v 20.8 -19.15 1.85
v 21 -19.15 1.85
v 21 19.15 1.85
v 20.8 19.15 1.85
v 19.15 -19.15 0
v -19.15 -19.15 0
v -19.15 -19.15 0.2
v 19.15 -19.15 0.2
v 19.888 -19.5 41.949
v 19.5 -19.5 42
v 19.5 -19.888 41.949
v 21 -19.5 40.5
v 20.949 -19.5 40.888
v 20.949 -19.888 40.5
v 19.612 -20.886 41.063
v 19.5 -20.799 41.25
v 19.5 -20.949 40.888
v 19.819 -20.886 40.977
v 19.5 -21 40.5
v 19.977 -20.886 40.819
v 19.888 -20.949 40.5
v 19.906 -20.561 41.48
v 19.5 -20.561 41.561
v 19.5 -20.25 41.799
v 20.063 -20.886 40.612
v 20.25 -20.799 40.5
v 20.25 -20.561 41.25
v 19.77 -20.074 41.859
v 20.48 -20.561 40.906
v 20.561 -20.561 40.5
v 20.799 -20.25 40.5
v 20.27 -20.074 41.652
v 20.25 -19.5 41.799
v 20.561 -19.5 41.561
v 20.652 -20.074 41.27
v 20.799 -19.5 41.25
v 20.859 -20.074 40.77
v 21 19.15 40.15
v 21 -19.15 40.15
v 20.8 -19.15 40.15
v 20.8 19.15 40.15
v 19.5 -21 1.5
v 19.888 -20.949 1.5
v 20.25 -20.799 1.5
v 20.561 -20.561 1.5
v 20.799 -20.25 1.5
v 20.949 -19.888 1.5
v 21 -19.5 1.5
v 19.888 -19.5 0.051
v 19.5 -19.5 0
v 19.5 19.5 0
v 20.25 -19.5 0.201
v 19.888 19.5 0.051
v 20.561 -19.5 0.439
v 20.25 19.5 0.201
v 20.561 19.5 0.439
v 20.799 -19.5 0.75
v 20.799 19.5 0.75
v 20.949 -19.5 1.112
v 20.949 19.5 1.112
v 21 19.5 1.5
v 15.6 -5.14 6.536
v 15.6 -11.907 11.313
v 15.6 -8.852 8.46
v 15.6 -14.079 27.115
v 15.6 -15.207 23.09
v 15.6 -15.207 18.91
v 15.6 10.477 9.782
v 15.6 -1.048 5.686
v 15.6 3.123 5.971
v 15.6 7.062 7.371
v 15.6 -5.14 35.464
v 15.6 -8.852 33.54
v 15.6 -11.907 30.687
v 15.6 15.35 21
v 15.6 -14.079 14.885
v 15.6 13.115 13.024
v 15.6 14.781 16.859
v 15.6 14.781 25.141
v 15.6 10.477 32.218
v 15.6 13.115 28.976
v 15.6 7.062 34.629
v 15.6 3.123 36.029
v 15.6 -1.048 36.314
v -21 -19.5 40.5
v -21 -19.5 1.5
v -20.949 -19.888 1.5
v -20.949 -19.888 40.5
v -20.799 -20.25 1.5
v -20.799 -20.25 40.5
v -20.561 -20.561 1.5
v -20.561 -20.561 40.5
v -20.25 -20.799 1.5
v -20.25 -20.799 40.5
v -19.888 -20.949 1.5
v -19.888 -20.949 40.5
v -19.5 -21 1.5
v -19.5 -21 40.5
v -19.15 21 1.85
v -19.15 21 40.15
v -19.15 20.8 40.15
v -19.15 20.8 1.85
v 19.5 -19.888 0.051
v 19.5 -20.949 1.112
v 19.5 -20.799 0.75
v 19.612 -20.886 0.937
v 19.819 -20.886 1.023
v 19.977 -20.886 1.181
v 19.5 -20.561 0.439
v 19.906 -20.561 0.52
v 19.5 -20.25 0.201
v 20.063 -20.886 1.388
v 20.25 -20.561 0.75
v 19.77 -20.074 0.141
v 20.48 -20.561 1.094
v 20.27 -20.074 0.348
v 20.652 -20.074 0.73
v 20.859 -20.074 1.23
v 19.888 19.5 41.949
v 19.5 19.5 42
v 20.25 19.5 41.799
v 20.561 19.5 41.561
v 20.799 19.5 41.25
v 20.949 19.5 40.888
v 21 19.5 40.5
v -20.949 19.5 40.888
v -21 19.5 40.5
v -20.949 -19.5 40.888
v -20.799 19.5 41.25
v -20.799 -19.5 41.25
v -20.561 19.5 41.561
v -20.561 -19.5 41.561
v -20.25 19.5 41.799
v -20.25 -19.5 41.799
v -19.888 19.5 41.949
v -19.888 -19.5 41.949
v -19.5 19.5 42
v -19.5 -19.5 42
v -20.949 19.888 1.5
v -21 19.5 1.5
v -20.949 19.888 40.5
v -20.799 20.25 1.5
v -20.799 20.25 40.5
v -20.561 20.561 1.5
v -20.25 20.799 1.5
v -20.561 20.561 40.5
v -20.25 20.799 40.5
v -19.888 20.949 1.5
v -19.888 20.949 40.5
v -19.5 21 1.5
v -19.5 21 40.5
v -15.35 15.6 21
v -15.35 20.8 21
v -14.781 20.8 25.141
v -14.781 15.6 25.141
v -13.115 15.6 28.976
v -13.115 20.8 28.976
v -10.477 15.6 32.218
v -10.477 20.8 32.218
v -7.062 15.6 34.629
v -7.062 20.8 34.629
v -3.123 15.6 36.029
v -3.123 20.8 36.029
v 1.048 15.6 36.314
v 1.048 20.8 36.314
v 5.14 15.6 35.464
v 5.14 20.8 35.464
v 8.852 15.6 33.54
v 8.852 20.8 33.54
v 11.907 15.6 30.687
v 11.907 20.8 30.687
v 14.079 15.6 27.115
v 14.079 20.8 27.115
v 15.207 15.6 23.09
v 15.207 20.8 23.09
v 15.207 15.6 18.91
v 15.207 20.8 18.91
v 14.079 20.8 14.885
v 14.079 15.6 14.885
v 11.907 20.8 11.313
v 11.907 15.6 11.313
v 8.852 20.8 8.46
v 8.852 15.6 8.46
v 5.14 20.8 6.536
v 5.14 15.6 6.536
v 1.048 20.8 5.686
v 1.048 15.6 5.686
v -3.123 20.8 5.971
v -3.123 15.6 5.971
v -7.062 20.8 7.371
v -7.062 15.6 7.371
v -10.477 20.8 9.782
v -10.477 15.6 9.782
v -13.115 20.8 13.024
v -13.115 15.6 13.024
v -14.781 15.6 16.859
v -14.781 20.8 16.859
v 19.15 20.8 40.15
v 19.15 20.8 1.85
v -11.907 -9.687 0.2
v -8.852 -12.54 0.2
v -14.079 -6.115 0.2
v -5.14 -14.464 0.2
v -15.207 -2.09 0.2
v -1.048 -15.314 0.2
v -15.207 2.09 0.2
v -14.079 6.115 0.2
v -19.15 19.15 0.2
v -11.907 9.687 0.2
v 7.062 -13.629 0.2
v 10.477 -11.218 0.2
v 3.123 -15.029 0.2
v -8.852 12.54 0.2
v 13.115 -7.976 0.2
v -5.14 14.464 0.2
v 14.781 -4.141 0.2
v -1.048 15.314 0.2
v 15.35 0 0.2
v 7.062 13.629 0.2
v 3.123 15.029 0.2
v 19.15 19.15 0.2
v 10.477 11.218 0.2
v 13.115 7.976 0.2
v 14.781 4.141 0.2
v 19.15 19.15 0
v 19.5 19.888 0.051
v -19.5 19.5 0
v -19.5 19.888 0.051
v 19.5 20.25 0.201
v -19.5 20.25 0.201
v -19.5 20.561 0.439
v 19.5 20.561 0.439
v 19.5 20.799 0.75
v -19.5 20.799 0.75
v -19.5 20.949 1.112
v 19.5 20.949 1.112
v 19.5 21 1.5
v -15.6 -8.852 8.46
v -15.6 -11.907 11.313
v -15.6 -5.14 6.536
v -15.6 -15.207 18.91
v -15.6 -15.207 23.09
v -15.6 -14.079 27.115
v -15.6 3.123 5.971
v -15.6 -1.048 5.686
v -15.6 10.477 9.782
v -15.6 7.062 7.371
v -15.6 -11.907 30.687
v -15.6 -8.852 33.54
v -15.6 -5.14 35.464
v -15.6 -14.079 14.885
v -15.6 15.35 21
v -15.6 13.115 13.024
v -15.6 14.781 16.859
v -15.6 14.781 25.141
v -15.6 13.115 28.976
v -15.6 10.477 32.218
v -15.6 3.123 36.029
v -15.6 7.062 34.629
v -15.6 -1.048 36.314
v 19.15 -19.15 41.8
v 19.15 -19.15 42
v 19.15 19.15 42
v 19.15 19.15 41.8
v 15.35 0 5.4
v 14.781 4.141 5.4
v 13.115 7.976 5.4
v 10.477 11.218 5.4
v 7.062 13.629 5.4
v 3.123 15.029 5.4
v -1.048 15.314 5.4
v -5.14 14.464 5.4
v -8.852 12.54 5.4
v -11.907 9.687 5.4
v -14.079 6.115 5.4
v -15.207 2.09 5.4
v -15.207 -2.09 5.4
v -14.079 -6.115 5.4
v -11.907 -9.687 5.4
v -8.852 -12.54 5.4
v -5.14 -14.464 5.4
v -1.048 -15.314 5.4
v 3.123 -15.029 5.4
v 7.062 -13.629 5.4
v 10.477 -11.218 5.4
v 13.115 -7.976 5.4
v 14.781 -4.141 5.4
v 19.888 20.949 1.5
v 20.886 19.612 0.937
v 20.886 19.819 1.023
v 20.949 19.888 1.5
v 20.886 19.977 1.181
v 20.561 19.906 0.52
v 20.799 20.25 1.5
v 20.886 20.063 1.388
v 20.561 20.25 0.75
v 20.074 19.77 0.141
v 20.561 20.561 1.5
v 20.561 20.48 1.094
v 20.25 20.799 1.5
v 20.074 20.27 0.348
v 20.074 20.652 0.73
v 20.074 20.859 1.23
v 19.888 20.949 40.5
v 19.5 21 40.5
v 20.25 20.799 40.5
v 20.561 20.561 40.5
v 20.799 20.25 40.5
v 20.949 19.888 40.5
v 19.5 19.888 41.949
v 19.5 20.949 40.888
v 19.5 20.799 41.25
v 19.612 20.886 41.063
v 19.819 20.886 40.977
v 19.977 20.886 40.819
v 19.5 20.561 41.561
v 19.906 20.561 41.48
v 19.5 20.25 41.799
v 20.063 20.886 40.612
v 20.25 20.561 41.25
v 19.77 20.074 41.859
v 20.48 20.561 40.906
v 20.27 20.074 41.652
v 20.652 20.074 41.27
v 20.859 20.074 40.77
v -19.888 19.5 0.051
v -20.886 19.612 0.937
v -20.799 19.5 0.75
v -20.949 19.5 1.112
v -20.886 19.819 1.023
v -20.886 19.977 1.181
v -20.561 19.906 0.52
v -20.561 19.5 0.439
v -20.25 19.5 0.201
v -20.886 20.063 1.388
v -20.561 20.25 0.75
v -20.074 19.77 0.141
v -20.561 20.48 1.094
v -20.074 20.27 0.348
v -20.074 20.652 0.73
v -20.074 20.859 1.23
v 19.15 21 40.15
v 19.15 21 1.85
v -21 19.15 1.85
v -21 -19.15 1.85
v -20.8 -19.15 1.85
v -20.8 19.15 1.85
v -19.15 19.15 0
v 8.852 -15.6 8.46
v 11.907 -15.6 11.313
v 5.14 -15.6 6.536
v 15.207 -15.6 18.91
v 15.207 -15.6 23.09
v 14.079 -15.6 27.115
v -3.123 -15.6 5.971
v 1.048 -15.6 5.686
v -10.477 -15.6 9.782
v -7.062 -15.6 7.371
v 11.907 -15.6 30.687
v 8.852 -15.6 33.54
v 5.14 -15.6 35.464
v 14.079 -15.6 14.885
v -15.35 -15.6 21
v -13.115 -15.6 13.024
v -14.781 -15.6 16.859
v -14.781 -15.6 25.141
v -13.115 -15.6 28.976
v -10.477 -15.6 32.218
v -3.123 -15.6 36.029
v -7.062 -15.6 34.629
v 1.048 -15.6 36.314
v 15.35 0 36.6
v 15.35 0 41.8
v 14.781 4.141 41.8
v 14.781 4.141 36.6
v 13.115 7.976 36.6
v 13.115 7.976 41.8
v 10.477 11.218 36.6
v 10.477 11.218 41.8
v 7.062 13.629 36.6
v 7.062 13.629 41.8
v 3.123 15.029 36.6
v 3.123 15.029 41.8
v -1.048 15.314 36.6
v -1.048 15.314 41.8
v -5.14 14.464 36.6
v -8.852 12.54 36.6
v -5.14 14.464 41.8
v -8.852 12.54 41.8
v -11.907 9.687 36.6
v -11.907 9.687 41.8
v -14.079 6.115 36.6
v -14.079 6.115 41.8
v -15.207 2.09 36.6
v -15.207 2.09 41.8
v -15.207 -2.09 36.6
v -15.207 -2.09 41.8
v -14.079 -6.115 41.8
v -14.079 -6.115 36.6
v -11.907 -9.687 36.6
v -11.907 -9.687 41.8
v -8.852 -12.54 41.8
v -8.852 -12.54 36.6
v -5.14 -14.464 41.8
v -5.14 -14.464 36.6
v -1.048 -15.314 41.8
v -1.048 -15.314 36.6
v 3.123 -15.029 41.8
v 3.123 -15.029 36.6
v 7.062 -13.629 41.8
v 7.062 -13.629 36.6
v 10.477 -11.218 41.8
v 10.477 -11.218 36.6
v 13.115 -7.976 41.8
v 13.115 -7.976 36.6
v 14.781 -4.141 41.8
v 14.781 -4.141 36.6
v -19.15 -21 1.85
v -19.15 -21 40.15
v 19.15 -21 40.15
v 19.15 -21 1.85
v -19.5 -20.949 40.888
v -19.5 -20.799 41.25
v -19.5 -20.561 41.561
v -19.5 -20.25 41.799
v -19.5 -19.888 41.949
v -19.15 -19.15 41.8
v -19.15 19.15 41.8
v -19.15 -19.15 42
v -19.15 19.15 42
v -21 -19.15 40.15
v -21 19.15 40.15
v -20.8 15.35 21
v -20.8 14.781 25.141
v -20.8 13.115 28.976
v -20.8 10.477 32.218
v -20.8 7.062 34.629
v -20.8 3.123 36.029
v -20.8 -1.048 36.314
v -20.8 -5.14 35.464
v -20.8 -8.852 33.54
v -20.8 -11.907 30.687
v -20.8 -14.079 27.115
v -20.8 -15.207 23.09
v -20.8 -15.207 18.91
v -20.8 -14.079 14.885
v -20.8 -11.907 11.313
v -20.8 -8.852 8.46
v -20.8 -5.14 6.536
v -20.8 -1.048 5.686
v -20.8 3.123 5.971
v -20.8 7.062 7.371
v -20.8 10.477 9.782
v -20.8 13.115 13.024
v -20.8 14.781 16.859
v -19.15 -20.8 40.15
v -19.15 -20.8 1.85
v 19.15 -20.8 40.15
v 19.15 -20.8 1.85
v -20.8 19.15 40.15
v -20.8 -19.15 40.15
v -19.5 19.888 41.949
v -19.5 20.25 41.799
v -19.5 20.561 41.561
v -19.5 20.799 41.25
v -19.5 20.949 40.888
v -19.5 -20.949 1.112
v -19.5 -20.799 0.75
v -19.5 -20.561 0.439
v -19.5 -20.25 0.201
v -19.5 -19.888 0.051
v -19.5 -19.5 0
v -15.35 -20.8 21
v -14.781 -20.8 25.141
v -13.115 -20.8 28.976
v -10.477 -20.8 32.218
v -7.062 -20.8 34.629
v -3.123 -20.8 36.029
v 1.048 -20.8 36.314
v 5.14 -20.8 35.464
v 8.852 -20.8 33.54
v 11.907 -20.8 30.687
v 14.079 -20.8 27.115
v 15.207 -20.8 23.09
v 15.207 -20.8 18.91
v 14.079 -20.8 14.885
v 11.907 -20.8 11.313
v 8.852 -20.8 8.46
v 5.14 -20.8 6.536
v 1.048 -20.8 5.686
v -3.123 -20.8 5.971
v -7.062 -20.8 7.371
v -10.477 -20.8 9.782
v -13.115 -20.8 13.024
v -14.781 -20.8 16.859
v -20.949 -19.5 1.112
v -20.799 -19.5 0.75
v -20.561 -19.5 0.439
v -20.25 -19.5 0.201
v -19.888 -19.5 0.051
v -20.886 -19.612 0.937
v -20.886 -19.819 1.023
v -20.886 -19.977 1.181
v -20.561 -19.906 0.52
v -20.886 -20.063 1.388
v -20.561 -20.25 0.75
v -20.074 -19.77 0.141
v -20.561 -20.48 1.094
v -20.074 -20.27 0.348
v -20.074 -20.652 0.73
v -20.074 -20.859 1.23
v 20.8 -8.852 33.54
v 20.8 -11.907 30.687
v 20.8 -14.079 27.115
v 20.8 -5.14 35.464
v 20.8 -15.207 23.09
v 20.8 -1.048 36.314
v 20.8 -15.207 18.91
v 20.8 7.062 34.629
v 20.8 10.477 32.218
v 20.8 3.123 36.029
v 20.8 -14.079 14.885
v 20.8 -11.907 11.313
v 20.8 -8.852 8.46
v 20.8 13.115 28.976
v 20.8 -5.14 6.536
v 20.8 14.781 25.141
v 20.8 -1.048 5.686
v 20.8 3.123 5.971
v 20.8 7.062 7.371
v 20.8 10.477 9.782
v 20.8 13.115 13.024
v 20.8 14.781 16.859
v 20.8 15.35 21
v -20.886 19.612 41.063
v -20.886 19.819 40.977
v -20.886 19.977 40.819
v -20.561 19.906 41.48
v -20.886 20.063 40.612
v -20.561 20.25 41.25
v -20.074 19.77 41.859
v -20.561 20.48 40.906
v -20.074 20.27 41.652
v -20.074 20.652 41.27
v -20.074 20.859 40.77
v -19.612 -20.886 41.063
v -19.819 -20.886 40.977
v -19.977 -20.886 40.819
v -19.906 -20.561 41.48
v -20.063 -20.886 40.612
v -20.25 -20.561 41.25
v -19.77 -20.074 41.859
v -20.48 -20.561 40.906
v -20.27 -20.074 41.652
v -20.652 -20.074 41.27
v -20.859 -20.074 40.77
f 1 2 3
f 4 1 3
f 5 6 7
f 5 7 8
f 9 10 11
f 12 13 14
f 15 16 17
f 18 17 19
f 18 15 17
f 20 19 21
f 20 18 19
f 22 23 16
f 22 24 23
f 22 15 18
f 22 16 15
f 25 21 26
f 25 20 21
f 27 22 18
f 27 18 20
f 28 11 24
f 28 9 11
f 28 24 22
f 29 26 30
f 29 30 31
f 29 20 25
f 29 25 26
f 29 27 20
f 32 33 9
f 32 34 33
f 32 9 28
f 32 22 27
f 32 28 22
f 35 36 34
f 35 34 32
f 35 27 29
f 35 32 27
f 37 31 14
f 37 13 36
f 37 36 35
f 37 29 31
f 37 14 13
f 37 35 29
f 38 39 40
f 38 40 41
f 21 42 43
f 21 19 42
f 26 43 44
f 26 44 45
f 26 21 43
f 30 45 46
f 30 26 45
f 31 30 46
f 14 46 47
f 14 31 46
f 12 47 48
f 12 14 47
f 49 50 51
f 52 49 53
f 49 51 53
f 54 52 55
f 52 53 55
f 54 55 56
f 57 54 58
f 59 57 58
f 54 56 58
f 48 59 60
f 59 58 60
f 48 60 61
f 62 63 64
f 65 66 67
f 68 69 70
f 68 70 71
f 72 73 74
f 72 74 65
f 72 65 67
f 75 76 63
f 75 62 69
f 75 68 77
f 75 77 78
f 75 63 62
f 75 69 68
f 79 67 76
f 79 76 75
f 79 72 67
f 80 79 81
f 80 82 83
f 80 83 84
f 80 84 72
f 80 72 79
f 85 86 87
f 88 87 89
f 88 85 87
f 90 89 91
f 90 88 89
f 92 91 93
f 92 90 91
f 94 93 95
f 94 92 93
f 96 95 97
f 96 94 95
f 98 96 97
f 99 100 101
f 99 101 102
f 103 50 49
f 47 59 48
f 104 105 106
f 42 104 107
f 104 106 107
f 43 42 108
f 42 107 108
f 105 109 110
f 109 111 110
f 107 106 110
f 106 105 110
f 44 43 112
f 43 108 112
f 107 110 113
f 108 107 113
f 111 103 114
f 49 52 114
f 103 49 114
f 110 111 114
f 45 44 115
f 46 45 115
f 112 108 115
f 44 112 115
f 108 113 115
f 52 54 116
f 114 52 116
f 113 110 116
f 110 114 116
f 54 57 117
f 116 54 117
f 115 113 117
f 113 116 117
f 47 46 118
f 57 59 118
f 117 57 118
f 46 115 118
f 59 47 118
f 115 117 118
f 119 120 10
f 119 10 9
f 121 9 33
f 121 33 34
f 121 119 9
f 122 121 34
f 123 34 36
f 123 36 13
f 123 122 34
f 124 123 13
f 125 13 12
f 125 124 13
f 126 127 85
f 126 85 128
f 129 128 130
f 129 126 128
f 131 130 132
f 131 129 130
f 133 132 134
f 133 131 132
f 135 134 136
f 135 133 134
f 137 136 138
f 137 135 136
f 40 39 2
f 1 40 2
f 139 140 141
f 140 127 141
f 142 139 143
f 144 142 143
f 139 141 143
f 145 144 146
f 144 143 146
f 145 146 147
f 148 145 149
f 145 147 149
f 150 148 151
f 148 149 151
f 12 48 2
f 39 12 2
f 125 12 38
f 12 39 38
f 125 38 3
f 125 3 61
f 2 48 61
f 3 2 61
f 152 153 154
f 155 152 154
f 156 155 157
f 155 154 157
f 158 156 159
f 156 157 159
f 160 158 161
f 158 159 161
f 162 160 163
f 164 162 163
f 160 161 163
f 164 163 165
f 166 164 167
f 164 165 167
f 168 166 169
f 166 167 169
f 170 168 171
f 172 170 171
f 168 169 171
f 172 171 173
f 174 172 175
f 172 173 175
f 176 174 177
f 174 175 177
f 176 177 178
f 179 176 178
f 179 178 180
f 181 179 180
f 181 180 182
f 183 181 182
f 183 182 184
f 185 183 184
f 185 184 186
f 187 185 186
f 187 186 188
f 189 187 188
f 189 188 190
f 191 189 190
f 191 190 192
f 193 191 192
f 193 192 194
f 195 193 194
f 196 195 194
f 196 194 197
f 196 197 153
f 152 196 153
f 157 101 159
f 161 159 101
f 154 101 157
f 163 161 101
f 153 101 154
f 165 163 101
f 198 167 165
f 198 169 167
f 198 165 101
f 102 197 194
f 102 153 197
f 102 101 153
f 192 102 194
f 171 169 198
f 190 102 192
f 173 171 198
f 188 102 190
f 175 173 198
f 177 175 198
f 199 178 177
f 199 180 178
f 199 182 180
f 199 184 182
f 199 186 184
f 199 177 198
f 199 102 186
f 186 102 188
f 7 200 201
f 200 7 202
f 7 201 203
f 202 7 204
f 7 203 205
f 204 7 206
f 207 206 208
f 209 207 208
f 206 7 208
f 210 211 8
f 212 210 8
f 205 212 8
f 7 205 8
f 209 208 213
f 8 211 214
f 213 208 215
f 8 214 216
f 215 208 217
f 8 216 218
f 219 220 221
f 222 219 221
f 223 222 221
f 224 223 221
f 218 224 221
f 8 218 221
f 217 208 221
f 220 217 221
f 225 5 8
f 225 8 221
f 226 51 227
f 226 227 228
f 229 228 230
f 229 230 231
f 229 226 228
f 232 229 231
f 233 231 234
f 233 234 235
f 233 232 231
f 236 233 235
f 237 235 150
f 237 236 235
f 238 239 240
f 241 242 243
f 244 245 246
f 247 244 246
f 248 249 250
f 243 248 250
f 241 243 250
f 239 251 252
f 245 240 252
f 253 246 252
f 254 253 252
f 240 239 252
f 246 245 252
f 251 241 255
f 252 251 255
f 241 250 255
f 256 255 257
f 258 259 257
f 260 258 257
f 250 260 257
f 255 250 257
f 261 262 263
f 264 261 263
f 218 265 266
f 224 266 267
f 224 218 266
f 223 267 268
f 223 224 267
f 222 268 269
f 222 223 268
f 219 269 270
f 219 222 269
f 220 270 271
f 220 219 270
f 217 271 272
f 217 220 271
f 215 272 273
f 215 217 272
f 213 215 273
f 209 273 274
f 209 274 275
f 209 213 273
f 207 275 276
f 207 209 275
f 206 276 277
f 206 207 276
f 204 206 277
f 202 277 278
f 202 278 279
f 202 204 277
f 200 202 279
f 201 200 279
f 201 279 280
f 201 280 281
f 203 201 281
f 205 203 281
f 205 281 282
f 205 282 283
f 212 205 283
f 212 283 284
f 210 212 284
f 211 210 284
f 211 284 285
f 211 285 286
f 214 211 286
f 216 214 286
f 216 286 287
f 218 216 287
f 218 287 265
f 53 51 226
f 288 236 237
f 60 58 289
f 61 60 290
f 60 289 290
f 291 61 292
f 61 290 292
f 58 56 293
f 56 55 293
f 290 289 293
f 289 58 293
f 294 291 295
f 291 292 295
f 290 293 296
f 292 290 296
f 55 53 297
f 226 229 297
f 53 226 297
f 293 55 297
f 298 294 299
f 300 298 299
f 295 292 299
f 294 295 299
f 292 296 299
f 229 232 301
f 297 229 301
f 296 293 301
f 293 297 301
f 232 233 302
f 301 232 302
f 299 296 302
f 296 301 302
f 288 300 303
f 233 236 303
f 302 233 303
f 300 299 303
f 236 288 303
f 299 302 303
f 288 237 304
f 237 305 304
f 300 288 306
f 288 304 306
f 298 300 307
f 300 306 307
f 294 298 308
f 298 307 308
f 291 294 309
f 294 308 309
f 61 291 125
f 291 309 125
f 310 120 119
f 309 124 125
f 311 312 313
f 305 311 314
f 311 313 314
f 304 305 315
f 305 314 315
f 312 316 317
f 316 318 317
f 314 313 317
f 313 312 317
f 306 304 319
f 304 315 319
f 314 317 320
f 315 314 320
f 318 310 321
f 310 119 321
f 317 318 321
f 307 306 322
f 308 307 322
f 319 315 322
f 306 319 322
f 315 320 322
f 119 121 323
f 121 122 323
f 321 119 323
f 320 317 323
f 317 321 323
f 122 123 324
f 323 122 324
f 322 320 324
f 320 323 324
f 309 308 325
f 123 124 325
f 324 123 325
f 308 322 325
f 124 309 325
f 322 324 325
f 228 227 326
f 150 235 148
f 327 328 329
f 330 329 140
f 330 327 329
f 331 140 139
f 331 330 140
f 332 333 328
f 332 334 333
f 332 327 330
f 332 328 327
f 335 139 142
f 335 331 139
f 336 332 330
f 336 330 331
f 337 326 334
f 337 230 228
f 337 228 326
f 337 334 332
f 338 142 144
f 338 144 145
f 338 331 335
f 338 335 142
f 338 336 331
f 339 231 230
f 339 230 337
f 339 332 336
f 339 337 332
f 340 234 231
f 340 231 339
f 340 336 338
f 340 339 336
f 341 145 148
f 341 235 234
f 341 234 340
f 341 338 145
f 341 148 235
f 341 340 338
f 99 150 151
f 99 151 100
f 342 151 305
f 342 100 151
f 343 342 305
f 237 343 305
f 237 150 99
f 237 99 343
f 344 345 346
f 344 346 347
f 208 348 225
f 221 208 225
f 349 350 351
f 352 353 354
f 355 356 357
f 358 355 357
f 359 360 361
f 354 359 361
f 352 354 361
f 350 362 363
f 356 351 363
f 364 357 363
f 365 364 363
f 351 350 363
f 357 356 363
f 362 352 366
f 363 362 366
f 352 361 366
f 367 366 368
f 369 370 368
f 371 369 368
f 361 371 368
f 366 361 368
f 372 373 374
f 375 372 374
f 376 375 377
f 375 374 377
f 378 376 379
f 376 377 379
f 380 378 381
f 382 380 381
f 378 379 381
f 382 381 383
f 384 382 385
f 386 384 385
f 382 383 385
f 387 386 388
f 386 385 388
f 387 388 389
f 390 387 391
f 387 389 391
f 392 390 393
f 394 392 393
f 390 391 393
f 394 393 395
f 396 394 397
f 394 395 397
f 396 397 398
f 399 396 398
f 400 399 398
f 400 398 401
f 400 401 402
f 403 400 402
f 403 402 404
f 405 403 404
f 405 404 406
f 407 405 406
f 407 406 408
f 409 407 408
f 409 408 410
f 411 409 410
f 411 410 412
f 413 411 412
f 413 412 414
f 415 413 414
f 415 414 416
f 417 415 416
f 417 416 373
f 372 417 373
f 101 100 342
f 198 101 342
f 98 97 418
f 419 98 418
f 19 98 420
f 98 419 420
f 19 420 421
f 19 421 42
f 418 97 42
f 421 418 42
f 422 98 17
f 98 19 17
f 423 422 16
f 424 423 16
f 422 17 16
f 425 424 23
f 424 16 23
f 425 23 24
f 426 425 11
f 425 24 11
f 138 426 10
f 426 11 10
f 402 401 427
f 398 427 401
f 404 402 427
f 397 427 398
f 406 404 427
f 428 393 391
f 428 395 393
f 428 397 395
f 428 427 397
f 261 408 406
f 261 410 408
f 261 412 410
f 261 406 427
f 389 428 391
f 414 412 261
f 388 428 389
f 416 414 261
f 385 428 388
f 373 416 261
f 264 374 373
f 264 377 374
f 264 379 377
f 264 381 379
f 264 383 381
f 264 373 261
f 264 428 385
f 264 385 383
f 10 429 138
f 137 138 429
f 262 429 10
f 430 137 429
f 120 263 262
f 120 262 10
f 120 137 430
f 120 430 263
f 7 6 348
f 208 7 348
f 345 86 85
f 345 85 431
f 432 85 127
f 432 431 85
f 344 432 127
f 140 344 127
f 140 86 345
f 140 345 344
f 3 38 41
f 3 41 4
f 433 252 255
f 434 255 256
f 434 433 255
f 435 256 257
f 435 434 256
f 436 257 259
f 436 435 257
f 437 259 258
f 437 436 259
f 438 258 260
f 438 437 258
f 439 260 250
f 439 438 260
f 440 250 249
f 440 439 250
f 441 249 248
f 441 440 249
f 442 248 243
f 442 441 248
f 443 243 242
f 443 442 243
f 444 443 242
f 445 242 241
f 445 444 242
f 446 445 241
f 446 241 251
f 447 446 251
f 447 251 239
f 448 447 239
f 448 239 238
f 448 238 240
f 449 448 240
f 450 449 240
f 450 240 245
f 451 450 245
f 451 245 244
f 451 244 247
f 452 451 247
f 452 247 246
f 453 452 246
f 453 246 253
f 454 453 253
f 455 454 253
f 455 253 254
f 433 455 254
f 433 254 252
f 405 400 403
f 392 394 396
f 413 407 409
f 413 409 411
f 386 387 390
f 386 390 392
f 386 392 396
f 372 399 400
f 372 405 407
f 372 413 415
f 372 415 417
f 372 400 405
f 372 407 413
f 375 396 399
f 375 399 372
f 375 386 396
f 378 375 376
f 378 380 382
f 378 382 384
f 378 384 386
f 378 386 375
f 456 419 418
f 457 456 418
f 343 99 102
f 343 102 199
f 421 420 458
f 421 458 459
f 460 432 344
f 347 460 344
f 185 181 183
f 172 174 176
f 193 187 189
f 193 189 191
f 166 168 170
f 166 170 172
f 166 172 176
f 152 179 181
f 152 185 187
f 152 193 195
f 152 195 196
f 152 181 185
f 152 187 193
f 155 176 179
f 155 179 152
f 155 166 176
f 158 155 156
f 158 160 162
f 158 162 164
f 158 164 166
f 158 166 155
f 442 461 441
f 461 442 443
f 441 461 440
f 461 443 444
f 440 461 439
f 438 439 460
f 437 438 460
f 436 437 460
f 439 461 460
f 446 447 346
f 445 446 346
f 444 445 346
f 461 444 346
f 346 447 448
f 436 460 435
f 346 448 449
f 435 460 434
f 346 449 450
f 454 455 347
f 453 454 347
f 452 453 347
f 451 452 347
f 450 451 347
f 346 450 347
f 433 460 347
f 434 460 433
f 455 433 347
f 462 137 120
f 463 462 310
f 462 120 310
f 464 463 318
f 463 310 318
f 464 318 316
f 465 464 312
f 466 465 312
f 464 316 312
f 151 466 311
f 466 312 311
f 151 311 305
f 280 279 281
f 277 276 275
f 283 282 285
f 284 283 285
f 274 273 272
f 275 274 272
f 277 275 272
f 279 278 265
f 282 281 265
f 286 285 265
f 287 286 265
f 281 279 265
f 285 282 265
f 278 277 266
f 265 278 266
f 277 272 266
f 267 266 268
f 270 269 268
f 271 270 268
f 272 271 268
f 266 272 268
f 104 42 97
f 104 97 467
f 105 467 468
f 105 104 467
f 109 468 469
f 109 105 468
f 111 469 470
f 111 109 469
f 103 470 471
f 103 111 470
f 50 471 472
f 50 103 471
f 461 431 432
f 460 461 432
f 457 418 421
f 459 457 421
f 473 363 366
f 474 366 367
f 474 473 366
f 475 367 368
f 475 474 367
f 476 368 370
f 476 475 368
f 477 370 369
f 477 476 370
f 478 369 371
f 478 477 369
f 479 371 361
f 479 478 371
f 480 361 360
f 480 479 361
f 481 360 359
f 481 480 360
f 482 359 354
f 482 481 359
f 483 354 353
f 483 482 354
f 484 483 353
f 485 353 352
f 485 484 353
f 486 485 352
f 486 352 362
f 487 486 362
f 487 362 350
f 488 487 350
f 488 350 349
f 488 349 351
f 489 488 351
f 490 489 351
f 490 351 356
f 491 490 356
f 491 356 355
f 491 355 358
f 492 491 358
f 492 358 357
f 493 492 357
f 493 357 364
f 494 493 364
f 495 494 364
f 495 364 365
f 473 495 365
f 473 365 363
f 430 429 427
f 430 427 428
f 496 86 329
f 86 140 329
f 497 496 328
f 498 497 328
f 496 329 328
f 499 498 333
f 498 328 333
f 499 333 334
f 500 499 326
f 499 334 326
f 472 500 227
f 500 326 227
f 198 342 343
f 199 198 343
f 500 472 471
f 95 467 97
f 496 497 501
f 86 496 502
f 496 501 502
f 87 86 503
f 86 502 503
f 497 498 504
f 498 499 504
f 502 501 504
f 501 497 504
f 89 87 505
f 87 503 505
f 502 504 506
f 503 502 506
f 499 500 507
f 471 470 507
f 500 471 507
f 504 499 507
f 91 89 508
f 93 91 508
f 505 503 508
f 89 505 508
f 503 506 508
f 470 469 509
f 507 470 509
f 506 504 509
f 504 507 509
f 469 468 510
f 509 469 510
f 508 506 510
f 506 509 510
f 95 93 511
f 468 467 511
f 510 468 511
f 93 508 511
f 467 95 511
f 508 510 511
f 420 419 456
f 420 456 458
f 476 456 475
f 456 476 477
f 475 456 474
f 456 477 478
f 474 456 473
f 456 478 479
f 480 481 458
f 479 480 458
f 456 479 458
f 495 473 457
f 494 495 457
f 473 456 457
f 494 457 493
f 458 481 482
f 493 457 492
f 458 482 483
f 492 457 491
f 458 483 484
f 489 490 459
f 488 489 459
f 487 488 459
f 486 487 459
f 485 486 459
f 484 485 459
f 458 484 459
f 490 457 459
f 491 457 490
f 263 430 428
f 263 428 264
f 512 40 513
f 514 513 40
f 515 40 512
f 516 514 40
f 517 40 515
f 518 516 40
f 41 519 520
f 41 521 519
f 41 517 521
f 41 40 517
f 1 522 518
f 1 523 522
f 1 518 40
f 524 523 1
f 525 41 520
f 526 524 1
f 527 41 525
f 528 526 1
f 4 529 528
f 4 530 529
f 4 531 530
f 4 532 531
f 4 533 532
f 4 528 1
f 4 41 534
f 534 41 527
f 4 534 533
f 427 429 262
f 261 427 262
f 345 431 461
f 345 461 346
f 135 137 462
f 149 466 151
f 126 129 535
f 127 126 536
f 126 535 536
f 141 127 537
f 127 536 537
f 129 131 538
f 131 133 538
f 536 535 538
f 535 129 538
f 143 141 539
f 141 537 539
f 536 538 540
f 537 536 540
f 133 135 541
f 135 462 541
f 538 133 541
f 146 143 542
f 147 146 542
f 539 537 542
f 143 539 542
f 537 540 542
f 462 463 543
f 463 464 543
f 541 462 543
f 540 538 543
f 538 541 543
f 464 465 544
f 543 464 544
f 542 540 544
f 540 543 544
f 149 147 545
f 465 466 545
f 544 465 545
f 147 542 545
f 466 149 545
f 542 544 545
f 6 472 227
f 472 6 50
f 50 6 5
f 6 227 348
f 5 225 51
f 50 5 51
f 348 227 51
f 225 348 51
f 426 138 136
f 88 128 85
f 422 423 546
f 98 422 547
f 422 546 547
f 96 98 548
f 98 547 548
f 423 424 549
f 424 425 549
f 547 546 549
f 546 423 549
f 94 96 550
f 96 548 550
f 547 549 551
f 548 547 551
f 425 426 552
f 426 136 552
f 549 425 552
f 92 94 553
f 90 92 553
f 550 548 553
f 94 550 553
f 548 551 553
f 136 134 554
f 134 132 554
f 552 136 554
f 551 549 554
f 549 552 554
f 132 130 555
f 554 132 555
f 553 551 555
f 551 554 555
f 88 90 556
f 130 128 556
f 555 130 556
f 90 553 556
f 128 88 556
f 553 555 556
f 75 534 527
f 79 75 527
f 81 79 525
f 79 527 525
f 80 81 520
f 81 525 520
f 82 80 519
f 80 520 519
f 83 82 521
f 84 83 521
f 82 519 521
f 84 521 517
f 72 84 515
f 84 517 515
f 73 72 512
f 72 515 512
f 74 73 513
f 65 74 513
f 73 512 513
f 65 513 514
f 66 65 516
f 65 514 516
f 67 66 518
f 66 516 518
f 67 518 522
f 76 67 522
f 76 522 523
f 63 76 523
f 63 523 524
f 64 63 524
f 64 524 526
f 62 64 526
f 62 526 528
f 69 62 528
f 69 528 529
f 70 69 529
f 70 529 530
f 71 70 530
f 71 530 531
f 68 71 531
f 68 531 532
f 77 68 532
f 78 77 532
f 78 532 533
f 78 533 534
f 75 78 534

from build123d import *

# Parameters (mm, degrees)
SKETCH2_W           = 42
SKETCH2_H           = 42
BOSS_EXTRUDE1_DEPTH = 42
SKETCH3_R           = 15.35
CUT_EXTRUDE2_DEPTH  = 5.4
SKETCH4_W           = 38.3
SKETCH4_H           = 38.3
CUT_EXTRUDE3_DEPTH  = 0.2
SKETCH5_R           = 15.35
CUT_EXTRUDE4_DEPTH  = 5.4
SKETCH6_W           = 38.3
SKETCH6_H           = 38.3
CUT_EXTRUDE5_DEPTH  = 0.2
SKETCH7_R           = 15.35
CUT_EXTRUDE6_DEPTH  = 5.4
SKETCH8_W           = 38.3
SKETCH8_H           = 38.3
CUT_EXTRUDE7_DEPTH  = 0.2
FILLET1_R           = 1.5


with BuildPart() as part:
    # Sketch2 → Boss-Extrude1 (new body)
    with BuildSketch(Plane.XY):
        Rectangle(SKETCH2_W, SKETCH2_H)
    extrude(amount=BOSS_EXTRUDE1_DEPTH)

    # Sketch3 → Cut-Extrude2 (cut)
    with BuildSketch(Plane(origin=(0, 21, 0), x_dir=(1, 0, 0), z_dir=(0, 1, 0))):
        with Locations(Location((0, -21, 0), (0, 0, 180))):
            Circle(SKETCH3_R)
    cut_extrude2 = extrude(amount=-CUT_EXTRUDE2_DEPTH, mode=Mode.SUBTRACT)

    # Sketch4 → Cut-Extrude3 (cut)
    with BuildSketch(Plane(origin=(0, 21, 0), x_dir=(1, 0, 0), z_dir=(0, 1, 0))):
        with Locations((0, -21)):
            Rectangle(SKETCH4_W, SKETCH4_H)
    cut_extrude3 = extrude(amount=-CUT_EXTRUDE3_DEPTH, mode=Mode.SUBTRACT)

    # Mirror1: Cut-Extrude2, Cut-Extrude3 across plane
    add(cut_extrude2.mirror(Plane.ZX), mode=Mode.SUBTRACT)
    add(cut_extrude3.mirror(Plane.ZX), mode=Mode.SUBTRACT)

    # Sketch5 → Cut-Extrude4 (cut)
    with BuildSketch(Plane(origin=(21, 0, 0), x_dir=(0, 0, -1), z_dir=(1, 0, 0))):
        with Locations(Location((-21, 0, 0), (0, 0, 90))):
            Circle(SKETCH5_R)
    cut_extrude4 = extrude(amount=-CUT_EXTRUDE4_DEPTH, mode=Mode.SUBTRACT)

    # Sketch6 → Cut-Extrude5 (cut)
    with BuildSketch(Plane(origin=(21, 0, 0), x_dir=(0, 0, -1), z_dir=(1, 0, 0))):
        with Locations((-21, 0)):
            Rectangle(SKETCH6_W, SKETCH6_H)
    cut_extrude5 = extrude(amount=-CUT_EXTRUDE5_DEPTH, mode=Mode.SUBTRACT)

    # Sketch7 → Cut-Extrude6 (cut)
    with BuildSketch(Plane.XY.offset(42)):
        Circle(SKETCH7_R)
    cut_extrude6 = extrude(amount=-CUT_EXTRUDE6_DEPTH, mode=Mode.SUBTRACT)

    # Sketch8 → Cut-Extrude7 (cut)
    with BuildSketch(Plane.XY.offset(42)):
        Rectangle(SKETCH8_W, SKETCH8_H)
    cut_extrude7 = extrude(amount=-CUT_EXTRUDE7_DEPTH, mode=Mode.SUBTRACT)

    # Mirror2: Cut-Extrude4, Cut-Extrude5 across plane
    add(cut_extrude4.mirror(Plane(origin=(0, 0, 0), x_dir=(0, 0, 1), z_dir=(1, 0, 0))), mode=Mode.SUBTRACT)
    add(cut_extrude5.mirror(Plane(origin=(0, 0, 0), x_dir=(0, 0, 1), z_dir=(1, 0, 0))), mode=Mode.SUBTRACT)

    # Mirror3: Cut-Extrude6, Cut-Extrude7 across plane
    add(cut_extrude6.mirror(Plane(origin=(0, 0, 21), x_dir=(1, 0, 0), z_dir=(0, 0, -1))), mode=Mode.SUBTRACT)
    add(cut_extrude7.mirror(Plane(origin=(0, 0, 21), x_dir=(1, 0, 0), z_dir=(0, 0, -1))), mode=Mode.SUBTRACT)

    # Fillet1
    fillet1_edges = [part.edges().sort_by_distance(p)[0] for p in [
        (21, 0, 42),
        (0, 21, 42),
        (-21, 0, 42),
        (0, 21, 0),
        (21, 0, 0),
        (0, -21, 0),
        (-21, 0, 0),
        (0, -21, 42),
        (-21, 21, 21),
        (21, 21, 21),
        (21, -21, 21),
        (-21, -21, 21),
    ]]
    fillet(fillet1_edges, radius=FILLET1_R)


solid = part.part
